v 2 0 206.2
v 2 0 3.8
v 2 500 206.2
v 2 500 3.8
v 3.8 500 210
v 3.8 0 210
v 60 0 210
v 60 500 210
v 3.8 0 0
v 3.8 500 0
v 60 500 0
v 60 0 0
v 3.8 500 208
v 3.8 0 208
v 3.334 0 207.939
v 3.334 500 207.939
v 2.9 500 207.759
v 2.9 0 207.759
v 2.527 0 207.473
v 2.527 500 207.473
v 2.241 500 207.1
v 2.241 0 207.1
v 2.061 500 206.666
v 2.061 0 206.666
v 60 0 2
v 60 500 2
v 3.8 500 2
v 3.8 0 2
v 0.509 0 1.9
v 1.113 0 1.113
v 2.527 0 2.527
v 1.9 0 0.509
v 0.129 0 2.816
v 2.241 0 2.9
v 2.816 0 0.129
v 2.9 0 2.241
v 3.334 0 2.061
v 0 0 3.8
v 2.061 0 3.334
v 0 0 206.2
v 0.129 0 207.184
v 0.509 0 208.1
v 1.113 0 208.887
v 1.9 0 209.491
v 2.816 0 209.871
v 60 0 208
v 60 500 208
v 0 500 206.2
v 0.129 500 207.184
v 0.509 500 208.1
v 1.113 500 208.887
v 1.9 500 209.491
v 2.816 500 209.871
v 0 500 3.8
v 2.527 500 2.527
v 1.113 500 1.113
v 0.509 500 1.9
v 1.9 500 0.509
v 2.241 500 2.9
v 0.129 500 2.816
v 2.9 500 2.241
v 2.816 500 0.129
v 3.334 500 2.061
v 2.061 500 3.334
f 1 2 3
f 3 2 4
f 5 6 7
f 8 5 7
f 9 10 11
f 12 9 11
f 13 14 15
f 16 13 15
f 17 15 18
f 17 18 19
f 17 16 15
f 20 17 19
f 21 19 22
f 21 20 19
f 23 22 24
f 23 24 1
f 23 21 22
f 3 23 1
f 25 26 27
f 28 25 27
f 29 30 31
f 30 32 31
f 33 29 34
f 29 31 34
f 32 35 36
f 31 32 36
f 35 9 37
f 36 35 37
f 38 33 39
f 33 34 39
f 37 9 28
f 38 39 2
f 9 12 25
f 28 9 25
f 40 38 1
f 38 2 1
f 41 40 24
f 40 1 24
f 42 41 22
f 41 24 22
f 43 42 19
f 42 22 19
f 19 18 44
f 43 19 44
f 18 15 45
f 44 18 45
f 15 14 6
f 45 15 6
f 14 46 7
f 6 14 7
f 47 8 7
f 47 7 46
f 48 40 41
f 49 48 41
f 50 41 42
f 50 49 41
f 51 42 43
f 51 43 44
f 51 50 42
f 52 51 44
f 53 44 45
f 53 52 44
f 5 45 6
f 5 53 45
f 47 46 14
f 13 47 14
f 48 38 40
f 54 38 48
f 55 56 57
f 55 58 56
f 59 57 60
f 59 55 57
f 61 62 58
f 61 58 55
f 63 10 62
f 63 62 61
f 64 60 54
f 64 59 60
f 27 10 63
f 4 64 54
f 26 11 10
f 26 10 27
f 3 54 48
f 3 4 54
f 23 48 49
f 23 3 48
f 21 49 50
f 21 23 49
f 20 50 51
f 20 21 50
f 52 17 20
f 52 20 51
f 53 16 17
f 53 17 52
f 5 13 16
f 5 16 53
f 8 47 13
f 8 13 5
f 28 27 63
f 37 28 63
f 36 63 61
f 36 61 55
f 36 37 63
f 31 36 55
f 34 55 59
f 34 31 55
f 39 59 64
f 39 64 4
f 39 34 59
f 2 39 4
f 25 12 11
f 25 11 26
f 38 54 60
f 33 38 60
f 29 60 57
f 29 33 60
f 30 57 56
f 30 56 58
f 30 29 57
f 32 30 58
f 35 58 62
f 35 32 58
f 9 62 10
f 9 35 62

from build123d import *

# Parameters (mm, degrees)
SKETCH_1_W                         = 2
SKETCH_1_H                         = 500
SM_BASE_FLANGE_1_DEPTH             = 210
SM_EDGE_FLANGE_1_STRIP_W           = 11.6
SM_EDGE_FLANGE_1_STRIP_H           = 2
SM_EDGE_FLANGE_1_STRIP_CUT_DEPTH   = 500
SM_EDGE_FLANGE_1_STRIP_2_W         = 11.6
SM_EDGE_FLANGE_1_STRIP_2_H         = 2
SM_EDGE_FLANGE_1_STRIP_CUT_2_DEPTH = 500
SM_EDGE_FLANGE_1_DEPTH             = 500
SM_EDGE_FLANGE_1_BEND_DEPTH        = 500


# Sheet-metal steps are written as plain solids
with BuildPart() as part:
    # Sketch 1 → Базовая кромка1 (new body)
    with BuildSketch(Plane.XY):
        with Locations((1, 250)):
            Rectangle(SKETCH_1_W, SKETCH_1_H)
    extrude(amount=SM_BASE_FLANGE_1_DEPTH)

    # Ребро-кромка1 strip (across the edge) → Ребро-кромка1 strip cut (cut)
    with BuildSketch(Plane(origin=(2, 0, 0), x_dir=(0, 0, 1), z_dir=(0, 1, 0))):
        with Locations((-2, -1)):
            Rectangle(SM_EDGE_FLANGE_1_STRIP_W, SM_EDGE_FLANGE_1_STRIP_H)
    extrude(amount=SM_EDGE_FLANGE_1_STRIP_CUT_DEPTH, mode=Mode.SUBTRACT)

    # Ребро-кромка1 strip 2 (across the edge) → Ребро-кромка1 strip cut 2 (cut)
    with BuildSketch(Plane(origin=(2, 500, 210), x_dir=(0, 0, -1), z_dir=(0, -1, 0))):
        with Locations((-2, -1)):
            Rectangle(SM_EDGE_FLANGE_1_STRIP_2_W, SM_EDGE_FLANGE_1_STRIP_2_H)
    extrude(amount=SM_EDGE_FLANGE_1_STRIP_CUT_2_DEPTH, mode=Mode.SUBTRACT)

    # Ребро-кромка1 section (across the edge) → Ребро-кромка1 (add)
    with BuildSketch(Plane(origin=(2, 0, 0), x_dir=(0, 0, 1), z_dir=(0, 1, 0))):
        with BuildLine():
            Line((0, 1.8), (0, 58))
            Line((0, 58), (2, 58))
            Line((2, 58), (2, 1.8))
            ThreePointArc((2, 1.8), (2.527207794, 0.527207794), (3.8, 0))
            Line((3.8, 0), (3.8, -2))
            ThreePointArc((3.8, -2), (1.112994231, -0.887005769), (0, 1.8))
        make_face()
    extrude(amount=SM_EDGE_FLANGE_1_DEPTH)

    # Ребро-кромка1 section 2 (across the edge) → Ребро-кромка1 bend (add)
    with BuildSketch(Plane(origin=(2, 500, 210), x_dir=(0, 0, -1), z_dir=(0, -1, 0))):
        with BuildLine():
            Line((0, 1.8), (0, 58))
            Line((0, 58), (2, 58))
            Line((2, 58), (2, 1.8))
            ThreePointArc((2, 1.8), (2.527207794, 0.527207794), (3.8, 0))
            Line((3.8, 0), (3.8, -2))
            ThreePointArc((3.8, -2), (1.112994231, -0.887005769), (0, 1.8))
        make_face()
    extrude(amount=SM_EDGE_FLANGE_1_BEND_DEPTH)


solid = part.part
